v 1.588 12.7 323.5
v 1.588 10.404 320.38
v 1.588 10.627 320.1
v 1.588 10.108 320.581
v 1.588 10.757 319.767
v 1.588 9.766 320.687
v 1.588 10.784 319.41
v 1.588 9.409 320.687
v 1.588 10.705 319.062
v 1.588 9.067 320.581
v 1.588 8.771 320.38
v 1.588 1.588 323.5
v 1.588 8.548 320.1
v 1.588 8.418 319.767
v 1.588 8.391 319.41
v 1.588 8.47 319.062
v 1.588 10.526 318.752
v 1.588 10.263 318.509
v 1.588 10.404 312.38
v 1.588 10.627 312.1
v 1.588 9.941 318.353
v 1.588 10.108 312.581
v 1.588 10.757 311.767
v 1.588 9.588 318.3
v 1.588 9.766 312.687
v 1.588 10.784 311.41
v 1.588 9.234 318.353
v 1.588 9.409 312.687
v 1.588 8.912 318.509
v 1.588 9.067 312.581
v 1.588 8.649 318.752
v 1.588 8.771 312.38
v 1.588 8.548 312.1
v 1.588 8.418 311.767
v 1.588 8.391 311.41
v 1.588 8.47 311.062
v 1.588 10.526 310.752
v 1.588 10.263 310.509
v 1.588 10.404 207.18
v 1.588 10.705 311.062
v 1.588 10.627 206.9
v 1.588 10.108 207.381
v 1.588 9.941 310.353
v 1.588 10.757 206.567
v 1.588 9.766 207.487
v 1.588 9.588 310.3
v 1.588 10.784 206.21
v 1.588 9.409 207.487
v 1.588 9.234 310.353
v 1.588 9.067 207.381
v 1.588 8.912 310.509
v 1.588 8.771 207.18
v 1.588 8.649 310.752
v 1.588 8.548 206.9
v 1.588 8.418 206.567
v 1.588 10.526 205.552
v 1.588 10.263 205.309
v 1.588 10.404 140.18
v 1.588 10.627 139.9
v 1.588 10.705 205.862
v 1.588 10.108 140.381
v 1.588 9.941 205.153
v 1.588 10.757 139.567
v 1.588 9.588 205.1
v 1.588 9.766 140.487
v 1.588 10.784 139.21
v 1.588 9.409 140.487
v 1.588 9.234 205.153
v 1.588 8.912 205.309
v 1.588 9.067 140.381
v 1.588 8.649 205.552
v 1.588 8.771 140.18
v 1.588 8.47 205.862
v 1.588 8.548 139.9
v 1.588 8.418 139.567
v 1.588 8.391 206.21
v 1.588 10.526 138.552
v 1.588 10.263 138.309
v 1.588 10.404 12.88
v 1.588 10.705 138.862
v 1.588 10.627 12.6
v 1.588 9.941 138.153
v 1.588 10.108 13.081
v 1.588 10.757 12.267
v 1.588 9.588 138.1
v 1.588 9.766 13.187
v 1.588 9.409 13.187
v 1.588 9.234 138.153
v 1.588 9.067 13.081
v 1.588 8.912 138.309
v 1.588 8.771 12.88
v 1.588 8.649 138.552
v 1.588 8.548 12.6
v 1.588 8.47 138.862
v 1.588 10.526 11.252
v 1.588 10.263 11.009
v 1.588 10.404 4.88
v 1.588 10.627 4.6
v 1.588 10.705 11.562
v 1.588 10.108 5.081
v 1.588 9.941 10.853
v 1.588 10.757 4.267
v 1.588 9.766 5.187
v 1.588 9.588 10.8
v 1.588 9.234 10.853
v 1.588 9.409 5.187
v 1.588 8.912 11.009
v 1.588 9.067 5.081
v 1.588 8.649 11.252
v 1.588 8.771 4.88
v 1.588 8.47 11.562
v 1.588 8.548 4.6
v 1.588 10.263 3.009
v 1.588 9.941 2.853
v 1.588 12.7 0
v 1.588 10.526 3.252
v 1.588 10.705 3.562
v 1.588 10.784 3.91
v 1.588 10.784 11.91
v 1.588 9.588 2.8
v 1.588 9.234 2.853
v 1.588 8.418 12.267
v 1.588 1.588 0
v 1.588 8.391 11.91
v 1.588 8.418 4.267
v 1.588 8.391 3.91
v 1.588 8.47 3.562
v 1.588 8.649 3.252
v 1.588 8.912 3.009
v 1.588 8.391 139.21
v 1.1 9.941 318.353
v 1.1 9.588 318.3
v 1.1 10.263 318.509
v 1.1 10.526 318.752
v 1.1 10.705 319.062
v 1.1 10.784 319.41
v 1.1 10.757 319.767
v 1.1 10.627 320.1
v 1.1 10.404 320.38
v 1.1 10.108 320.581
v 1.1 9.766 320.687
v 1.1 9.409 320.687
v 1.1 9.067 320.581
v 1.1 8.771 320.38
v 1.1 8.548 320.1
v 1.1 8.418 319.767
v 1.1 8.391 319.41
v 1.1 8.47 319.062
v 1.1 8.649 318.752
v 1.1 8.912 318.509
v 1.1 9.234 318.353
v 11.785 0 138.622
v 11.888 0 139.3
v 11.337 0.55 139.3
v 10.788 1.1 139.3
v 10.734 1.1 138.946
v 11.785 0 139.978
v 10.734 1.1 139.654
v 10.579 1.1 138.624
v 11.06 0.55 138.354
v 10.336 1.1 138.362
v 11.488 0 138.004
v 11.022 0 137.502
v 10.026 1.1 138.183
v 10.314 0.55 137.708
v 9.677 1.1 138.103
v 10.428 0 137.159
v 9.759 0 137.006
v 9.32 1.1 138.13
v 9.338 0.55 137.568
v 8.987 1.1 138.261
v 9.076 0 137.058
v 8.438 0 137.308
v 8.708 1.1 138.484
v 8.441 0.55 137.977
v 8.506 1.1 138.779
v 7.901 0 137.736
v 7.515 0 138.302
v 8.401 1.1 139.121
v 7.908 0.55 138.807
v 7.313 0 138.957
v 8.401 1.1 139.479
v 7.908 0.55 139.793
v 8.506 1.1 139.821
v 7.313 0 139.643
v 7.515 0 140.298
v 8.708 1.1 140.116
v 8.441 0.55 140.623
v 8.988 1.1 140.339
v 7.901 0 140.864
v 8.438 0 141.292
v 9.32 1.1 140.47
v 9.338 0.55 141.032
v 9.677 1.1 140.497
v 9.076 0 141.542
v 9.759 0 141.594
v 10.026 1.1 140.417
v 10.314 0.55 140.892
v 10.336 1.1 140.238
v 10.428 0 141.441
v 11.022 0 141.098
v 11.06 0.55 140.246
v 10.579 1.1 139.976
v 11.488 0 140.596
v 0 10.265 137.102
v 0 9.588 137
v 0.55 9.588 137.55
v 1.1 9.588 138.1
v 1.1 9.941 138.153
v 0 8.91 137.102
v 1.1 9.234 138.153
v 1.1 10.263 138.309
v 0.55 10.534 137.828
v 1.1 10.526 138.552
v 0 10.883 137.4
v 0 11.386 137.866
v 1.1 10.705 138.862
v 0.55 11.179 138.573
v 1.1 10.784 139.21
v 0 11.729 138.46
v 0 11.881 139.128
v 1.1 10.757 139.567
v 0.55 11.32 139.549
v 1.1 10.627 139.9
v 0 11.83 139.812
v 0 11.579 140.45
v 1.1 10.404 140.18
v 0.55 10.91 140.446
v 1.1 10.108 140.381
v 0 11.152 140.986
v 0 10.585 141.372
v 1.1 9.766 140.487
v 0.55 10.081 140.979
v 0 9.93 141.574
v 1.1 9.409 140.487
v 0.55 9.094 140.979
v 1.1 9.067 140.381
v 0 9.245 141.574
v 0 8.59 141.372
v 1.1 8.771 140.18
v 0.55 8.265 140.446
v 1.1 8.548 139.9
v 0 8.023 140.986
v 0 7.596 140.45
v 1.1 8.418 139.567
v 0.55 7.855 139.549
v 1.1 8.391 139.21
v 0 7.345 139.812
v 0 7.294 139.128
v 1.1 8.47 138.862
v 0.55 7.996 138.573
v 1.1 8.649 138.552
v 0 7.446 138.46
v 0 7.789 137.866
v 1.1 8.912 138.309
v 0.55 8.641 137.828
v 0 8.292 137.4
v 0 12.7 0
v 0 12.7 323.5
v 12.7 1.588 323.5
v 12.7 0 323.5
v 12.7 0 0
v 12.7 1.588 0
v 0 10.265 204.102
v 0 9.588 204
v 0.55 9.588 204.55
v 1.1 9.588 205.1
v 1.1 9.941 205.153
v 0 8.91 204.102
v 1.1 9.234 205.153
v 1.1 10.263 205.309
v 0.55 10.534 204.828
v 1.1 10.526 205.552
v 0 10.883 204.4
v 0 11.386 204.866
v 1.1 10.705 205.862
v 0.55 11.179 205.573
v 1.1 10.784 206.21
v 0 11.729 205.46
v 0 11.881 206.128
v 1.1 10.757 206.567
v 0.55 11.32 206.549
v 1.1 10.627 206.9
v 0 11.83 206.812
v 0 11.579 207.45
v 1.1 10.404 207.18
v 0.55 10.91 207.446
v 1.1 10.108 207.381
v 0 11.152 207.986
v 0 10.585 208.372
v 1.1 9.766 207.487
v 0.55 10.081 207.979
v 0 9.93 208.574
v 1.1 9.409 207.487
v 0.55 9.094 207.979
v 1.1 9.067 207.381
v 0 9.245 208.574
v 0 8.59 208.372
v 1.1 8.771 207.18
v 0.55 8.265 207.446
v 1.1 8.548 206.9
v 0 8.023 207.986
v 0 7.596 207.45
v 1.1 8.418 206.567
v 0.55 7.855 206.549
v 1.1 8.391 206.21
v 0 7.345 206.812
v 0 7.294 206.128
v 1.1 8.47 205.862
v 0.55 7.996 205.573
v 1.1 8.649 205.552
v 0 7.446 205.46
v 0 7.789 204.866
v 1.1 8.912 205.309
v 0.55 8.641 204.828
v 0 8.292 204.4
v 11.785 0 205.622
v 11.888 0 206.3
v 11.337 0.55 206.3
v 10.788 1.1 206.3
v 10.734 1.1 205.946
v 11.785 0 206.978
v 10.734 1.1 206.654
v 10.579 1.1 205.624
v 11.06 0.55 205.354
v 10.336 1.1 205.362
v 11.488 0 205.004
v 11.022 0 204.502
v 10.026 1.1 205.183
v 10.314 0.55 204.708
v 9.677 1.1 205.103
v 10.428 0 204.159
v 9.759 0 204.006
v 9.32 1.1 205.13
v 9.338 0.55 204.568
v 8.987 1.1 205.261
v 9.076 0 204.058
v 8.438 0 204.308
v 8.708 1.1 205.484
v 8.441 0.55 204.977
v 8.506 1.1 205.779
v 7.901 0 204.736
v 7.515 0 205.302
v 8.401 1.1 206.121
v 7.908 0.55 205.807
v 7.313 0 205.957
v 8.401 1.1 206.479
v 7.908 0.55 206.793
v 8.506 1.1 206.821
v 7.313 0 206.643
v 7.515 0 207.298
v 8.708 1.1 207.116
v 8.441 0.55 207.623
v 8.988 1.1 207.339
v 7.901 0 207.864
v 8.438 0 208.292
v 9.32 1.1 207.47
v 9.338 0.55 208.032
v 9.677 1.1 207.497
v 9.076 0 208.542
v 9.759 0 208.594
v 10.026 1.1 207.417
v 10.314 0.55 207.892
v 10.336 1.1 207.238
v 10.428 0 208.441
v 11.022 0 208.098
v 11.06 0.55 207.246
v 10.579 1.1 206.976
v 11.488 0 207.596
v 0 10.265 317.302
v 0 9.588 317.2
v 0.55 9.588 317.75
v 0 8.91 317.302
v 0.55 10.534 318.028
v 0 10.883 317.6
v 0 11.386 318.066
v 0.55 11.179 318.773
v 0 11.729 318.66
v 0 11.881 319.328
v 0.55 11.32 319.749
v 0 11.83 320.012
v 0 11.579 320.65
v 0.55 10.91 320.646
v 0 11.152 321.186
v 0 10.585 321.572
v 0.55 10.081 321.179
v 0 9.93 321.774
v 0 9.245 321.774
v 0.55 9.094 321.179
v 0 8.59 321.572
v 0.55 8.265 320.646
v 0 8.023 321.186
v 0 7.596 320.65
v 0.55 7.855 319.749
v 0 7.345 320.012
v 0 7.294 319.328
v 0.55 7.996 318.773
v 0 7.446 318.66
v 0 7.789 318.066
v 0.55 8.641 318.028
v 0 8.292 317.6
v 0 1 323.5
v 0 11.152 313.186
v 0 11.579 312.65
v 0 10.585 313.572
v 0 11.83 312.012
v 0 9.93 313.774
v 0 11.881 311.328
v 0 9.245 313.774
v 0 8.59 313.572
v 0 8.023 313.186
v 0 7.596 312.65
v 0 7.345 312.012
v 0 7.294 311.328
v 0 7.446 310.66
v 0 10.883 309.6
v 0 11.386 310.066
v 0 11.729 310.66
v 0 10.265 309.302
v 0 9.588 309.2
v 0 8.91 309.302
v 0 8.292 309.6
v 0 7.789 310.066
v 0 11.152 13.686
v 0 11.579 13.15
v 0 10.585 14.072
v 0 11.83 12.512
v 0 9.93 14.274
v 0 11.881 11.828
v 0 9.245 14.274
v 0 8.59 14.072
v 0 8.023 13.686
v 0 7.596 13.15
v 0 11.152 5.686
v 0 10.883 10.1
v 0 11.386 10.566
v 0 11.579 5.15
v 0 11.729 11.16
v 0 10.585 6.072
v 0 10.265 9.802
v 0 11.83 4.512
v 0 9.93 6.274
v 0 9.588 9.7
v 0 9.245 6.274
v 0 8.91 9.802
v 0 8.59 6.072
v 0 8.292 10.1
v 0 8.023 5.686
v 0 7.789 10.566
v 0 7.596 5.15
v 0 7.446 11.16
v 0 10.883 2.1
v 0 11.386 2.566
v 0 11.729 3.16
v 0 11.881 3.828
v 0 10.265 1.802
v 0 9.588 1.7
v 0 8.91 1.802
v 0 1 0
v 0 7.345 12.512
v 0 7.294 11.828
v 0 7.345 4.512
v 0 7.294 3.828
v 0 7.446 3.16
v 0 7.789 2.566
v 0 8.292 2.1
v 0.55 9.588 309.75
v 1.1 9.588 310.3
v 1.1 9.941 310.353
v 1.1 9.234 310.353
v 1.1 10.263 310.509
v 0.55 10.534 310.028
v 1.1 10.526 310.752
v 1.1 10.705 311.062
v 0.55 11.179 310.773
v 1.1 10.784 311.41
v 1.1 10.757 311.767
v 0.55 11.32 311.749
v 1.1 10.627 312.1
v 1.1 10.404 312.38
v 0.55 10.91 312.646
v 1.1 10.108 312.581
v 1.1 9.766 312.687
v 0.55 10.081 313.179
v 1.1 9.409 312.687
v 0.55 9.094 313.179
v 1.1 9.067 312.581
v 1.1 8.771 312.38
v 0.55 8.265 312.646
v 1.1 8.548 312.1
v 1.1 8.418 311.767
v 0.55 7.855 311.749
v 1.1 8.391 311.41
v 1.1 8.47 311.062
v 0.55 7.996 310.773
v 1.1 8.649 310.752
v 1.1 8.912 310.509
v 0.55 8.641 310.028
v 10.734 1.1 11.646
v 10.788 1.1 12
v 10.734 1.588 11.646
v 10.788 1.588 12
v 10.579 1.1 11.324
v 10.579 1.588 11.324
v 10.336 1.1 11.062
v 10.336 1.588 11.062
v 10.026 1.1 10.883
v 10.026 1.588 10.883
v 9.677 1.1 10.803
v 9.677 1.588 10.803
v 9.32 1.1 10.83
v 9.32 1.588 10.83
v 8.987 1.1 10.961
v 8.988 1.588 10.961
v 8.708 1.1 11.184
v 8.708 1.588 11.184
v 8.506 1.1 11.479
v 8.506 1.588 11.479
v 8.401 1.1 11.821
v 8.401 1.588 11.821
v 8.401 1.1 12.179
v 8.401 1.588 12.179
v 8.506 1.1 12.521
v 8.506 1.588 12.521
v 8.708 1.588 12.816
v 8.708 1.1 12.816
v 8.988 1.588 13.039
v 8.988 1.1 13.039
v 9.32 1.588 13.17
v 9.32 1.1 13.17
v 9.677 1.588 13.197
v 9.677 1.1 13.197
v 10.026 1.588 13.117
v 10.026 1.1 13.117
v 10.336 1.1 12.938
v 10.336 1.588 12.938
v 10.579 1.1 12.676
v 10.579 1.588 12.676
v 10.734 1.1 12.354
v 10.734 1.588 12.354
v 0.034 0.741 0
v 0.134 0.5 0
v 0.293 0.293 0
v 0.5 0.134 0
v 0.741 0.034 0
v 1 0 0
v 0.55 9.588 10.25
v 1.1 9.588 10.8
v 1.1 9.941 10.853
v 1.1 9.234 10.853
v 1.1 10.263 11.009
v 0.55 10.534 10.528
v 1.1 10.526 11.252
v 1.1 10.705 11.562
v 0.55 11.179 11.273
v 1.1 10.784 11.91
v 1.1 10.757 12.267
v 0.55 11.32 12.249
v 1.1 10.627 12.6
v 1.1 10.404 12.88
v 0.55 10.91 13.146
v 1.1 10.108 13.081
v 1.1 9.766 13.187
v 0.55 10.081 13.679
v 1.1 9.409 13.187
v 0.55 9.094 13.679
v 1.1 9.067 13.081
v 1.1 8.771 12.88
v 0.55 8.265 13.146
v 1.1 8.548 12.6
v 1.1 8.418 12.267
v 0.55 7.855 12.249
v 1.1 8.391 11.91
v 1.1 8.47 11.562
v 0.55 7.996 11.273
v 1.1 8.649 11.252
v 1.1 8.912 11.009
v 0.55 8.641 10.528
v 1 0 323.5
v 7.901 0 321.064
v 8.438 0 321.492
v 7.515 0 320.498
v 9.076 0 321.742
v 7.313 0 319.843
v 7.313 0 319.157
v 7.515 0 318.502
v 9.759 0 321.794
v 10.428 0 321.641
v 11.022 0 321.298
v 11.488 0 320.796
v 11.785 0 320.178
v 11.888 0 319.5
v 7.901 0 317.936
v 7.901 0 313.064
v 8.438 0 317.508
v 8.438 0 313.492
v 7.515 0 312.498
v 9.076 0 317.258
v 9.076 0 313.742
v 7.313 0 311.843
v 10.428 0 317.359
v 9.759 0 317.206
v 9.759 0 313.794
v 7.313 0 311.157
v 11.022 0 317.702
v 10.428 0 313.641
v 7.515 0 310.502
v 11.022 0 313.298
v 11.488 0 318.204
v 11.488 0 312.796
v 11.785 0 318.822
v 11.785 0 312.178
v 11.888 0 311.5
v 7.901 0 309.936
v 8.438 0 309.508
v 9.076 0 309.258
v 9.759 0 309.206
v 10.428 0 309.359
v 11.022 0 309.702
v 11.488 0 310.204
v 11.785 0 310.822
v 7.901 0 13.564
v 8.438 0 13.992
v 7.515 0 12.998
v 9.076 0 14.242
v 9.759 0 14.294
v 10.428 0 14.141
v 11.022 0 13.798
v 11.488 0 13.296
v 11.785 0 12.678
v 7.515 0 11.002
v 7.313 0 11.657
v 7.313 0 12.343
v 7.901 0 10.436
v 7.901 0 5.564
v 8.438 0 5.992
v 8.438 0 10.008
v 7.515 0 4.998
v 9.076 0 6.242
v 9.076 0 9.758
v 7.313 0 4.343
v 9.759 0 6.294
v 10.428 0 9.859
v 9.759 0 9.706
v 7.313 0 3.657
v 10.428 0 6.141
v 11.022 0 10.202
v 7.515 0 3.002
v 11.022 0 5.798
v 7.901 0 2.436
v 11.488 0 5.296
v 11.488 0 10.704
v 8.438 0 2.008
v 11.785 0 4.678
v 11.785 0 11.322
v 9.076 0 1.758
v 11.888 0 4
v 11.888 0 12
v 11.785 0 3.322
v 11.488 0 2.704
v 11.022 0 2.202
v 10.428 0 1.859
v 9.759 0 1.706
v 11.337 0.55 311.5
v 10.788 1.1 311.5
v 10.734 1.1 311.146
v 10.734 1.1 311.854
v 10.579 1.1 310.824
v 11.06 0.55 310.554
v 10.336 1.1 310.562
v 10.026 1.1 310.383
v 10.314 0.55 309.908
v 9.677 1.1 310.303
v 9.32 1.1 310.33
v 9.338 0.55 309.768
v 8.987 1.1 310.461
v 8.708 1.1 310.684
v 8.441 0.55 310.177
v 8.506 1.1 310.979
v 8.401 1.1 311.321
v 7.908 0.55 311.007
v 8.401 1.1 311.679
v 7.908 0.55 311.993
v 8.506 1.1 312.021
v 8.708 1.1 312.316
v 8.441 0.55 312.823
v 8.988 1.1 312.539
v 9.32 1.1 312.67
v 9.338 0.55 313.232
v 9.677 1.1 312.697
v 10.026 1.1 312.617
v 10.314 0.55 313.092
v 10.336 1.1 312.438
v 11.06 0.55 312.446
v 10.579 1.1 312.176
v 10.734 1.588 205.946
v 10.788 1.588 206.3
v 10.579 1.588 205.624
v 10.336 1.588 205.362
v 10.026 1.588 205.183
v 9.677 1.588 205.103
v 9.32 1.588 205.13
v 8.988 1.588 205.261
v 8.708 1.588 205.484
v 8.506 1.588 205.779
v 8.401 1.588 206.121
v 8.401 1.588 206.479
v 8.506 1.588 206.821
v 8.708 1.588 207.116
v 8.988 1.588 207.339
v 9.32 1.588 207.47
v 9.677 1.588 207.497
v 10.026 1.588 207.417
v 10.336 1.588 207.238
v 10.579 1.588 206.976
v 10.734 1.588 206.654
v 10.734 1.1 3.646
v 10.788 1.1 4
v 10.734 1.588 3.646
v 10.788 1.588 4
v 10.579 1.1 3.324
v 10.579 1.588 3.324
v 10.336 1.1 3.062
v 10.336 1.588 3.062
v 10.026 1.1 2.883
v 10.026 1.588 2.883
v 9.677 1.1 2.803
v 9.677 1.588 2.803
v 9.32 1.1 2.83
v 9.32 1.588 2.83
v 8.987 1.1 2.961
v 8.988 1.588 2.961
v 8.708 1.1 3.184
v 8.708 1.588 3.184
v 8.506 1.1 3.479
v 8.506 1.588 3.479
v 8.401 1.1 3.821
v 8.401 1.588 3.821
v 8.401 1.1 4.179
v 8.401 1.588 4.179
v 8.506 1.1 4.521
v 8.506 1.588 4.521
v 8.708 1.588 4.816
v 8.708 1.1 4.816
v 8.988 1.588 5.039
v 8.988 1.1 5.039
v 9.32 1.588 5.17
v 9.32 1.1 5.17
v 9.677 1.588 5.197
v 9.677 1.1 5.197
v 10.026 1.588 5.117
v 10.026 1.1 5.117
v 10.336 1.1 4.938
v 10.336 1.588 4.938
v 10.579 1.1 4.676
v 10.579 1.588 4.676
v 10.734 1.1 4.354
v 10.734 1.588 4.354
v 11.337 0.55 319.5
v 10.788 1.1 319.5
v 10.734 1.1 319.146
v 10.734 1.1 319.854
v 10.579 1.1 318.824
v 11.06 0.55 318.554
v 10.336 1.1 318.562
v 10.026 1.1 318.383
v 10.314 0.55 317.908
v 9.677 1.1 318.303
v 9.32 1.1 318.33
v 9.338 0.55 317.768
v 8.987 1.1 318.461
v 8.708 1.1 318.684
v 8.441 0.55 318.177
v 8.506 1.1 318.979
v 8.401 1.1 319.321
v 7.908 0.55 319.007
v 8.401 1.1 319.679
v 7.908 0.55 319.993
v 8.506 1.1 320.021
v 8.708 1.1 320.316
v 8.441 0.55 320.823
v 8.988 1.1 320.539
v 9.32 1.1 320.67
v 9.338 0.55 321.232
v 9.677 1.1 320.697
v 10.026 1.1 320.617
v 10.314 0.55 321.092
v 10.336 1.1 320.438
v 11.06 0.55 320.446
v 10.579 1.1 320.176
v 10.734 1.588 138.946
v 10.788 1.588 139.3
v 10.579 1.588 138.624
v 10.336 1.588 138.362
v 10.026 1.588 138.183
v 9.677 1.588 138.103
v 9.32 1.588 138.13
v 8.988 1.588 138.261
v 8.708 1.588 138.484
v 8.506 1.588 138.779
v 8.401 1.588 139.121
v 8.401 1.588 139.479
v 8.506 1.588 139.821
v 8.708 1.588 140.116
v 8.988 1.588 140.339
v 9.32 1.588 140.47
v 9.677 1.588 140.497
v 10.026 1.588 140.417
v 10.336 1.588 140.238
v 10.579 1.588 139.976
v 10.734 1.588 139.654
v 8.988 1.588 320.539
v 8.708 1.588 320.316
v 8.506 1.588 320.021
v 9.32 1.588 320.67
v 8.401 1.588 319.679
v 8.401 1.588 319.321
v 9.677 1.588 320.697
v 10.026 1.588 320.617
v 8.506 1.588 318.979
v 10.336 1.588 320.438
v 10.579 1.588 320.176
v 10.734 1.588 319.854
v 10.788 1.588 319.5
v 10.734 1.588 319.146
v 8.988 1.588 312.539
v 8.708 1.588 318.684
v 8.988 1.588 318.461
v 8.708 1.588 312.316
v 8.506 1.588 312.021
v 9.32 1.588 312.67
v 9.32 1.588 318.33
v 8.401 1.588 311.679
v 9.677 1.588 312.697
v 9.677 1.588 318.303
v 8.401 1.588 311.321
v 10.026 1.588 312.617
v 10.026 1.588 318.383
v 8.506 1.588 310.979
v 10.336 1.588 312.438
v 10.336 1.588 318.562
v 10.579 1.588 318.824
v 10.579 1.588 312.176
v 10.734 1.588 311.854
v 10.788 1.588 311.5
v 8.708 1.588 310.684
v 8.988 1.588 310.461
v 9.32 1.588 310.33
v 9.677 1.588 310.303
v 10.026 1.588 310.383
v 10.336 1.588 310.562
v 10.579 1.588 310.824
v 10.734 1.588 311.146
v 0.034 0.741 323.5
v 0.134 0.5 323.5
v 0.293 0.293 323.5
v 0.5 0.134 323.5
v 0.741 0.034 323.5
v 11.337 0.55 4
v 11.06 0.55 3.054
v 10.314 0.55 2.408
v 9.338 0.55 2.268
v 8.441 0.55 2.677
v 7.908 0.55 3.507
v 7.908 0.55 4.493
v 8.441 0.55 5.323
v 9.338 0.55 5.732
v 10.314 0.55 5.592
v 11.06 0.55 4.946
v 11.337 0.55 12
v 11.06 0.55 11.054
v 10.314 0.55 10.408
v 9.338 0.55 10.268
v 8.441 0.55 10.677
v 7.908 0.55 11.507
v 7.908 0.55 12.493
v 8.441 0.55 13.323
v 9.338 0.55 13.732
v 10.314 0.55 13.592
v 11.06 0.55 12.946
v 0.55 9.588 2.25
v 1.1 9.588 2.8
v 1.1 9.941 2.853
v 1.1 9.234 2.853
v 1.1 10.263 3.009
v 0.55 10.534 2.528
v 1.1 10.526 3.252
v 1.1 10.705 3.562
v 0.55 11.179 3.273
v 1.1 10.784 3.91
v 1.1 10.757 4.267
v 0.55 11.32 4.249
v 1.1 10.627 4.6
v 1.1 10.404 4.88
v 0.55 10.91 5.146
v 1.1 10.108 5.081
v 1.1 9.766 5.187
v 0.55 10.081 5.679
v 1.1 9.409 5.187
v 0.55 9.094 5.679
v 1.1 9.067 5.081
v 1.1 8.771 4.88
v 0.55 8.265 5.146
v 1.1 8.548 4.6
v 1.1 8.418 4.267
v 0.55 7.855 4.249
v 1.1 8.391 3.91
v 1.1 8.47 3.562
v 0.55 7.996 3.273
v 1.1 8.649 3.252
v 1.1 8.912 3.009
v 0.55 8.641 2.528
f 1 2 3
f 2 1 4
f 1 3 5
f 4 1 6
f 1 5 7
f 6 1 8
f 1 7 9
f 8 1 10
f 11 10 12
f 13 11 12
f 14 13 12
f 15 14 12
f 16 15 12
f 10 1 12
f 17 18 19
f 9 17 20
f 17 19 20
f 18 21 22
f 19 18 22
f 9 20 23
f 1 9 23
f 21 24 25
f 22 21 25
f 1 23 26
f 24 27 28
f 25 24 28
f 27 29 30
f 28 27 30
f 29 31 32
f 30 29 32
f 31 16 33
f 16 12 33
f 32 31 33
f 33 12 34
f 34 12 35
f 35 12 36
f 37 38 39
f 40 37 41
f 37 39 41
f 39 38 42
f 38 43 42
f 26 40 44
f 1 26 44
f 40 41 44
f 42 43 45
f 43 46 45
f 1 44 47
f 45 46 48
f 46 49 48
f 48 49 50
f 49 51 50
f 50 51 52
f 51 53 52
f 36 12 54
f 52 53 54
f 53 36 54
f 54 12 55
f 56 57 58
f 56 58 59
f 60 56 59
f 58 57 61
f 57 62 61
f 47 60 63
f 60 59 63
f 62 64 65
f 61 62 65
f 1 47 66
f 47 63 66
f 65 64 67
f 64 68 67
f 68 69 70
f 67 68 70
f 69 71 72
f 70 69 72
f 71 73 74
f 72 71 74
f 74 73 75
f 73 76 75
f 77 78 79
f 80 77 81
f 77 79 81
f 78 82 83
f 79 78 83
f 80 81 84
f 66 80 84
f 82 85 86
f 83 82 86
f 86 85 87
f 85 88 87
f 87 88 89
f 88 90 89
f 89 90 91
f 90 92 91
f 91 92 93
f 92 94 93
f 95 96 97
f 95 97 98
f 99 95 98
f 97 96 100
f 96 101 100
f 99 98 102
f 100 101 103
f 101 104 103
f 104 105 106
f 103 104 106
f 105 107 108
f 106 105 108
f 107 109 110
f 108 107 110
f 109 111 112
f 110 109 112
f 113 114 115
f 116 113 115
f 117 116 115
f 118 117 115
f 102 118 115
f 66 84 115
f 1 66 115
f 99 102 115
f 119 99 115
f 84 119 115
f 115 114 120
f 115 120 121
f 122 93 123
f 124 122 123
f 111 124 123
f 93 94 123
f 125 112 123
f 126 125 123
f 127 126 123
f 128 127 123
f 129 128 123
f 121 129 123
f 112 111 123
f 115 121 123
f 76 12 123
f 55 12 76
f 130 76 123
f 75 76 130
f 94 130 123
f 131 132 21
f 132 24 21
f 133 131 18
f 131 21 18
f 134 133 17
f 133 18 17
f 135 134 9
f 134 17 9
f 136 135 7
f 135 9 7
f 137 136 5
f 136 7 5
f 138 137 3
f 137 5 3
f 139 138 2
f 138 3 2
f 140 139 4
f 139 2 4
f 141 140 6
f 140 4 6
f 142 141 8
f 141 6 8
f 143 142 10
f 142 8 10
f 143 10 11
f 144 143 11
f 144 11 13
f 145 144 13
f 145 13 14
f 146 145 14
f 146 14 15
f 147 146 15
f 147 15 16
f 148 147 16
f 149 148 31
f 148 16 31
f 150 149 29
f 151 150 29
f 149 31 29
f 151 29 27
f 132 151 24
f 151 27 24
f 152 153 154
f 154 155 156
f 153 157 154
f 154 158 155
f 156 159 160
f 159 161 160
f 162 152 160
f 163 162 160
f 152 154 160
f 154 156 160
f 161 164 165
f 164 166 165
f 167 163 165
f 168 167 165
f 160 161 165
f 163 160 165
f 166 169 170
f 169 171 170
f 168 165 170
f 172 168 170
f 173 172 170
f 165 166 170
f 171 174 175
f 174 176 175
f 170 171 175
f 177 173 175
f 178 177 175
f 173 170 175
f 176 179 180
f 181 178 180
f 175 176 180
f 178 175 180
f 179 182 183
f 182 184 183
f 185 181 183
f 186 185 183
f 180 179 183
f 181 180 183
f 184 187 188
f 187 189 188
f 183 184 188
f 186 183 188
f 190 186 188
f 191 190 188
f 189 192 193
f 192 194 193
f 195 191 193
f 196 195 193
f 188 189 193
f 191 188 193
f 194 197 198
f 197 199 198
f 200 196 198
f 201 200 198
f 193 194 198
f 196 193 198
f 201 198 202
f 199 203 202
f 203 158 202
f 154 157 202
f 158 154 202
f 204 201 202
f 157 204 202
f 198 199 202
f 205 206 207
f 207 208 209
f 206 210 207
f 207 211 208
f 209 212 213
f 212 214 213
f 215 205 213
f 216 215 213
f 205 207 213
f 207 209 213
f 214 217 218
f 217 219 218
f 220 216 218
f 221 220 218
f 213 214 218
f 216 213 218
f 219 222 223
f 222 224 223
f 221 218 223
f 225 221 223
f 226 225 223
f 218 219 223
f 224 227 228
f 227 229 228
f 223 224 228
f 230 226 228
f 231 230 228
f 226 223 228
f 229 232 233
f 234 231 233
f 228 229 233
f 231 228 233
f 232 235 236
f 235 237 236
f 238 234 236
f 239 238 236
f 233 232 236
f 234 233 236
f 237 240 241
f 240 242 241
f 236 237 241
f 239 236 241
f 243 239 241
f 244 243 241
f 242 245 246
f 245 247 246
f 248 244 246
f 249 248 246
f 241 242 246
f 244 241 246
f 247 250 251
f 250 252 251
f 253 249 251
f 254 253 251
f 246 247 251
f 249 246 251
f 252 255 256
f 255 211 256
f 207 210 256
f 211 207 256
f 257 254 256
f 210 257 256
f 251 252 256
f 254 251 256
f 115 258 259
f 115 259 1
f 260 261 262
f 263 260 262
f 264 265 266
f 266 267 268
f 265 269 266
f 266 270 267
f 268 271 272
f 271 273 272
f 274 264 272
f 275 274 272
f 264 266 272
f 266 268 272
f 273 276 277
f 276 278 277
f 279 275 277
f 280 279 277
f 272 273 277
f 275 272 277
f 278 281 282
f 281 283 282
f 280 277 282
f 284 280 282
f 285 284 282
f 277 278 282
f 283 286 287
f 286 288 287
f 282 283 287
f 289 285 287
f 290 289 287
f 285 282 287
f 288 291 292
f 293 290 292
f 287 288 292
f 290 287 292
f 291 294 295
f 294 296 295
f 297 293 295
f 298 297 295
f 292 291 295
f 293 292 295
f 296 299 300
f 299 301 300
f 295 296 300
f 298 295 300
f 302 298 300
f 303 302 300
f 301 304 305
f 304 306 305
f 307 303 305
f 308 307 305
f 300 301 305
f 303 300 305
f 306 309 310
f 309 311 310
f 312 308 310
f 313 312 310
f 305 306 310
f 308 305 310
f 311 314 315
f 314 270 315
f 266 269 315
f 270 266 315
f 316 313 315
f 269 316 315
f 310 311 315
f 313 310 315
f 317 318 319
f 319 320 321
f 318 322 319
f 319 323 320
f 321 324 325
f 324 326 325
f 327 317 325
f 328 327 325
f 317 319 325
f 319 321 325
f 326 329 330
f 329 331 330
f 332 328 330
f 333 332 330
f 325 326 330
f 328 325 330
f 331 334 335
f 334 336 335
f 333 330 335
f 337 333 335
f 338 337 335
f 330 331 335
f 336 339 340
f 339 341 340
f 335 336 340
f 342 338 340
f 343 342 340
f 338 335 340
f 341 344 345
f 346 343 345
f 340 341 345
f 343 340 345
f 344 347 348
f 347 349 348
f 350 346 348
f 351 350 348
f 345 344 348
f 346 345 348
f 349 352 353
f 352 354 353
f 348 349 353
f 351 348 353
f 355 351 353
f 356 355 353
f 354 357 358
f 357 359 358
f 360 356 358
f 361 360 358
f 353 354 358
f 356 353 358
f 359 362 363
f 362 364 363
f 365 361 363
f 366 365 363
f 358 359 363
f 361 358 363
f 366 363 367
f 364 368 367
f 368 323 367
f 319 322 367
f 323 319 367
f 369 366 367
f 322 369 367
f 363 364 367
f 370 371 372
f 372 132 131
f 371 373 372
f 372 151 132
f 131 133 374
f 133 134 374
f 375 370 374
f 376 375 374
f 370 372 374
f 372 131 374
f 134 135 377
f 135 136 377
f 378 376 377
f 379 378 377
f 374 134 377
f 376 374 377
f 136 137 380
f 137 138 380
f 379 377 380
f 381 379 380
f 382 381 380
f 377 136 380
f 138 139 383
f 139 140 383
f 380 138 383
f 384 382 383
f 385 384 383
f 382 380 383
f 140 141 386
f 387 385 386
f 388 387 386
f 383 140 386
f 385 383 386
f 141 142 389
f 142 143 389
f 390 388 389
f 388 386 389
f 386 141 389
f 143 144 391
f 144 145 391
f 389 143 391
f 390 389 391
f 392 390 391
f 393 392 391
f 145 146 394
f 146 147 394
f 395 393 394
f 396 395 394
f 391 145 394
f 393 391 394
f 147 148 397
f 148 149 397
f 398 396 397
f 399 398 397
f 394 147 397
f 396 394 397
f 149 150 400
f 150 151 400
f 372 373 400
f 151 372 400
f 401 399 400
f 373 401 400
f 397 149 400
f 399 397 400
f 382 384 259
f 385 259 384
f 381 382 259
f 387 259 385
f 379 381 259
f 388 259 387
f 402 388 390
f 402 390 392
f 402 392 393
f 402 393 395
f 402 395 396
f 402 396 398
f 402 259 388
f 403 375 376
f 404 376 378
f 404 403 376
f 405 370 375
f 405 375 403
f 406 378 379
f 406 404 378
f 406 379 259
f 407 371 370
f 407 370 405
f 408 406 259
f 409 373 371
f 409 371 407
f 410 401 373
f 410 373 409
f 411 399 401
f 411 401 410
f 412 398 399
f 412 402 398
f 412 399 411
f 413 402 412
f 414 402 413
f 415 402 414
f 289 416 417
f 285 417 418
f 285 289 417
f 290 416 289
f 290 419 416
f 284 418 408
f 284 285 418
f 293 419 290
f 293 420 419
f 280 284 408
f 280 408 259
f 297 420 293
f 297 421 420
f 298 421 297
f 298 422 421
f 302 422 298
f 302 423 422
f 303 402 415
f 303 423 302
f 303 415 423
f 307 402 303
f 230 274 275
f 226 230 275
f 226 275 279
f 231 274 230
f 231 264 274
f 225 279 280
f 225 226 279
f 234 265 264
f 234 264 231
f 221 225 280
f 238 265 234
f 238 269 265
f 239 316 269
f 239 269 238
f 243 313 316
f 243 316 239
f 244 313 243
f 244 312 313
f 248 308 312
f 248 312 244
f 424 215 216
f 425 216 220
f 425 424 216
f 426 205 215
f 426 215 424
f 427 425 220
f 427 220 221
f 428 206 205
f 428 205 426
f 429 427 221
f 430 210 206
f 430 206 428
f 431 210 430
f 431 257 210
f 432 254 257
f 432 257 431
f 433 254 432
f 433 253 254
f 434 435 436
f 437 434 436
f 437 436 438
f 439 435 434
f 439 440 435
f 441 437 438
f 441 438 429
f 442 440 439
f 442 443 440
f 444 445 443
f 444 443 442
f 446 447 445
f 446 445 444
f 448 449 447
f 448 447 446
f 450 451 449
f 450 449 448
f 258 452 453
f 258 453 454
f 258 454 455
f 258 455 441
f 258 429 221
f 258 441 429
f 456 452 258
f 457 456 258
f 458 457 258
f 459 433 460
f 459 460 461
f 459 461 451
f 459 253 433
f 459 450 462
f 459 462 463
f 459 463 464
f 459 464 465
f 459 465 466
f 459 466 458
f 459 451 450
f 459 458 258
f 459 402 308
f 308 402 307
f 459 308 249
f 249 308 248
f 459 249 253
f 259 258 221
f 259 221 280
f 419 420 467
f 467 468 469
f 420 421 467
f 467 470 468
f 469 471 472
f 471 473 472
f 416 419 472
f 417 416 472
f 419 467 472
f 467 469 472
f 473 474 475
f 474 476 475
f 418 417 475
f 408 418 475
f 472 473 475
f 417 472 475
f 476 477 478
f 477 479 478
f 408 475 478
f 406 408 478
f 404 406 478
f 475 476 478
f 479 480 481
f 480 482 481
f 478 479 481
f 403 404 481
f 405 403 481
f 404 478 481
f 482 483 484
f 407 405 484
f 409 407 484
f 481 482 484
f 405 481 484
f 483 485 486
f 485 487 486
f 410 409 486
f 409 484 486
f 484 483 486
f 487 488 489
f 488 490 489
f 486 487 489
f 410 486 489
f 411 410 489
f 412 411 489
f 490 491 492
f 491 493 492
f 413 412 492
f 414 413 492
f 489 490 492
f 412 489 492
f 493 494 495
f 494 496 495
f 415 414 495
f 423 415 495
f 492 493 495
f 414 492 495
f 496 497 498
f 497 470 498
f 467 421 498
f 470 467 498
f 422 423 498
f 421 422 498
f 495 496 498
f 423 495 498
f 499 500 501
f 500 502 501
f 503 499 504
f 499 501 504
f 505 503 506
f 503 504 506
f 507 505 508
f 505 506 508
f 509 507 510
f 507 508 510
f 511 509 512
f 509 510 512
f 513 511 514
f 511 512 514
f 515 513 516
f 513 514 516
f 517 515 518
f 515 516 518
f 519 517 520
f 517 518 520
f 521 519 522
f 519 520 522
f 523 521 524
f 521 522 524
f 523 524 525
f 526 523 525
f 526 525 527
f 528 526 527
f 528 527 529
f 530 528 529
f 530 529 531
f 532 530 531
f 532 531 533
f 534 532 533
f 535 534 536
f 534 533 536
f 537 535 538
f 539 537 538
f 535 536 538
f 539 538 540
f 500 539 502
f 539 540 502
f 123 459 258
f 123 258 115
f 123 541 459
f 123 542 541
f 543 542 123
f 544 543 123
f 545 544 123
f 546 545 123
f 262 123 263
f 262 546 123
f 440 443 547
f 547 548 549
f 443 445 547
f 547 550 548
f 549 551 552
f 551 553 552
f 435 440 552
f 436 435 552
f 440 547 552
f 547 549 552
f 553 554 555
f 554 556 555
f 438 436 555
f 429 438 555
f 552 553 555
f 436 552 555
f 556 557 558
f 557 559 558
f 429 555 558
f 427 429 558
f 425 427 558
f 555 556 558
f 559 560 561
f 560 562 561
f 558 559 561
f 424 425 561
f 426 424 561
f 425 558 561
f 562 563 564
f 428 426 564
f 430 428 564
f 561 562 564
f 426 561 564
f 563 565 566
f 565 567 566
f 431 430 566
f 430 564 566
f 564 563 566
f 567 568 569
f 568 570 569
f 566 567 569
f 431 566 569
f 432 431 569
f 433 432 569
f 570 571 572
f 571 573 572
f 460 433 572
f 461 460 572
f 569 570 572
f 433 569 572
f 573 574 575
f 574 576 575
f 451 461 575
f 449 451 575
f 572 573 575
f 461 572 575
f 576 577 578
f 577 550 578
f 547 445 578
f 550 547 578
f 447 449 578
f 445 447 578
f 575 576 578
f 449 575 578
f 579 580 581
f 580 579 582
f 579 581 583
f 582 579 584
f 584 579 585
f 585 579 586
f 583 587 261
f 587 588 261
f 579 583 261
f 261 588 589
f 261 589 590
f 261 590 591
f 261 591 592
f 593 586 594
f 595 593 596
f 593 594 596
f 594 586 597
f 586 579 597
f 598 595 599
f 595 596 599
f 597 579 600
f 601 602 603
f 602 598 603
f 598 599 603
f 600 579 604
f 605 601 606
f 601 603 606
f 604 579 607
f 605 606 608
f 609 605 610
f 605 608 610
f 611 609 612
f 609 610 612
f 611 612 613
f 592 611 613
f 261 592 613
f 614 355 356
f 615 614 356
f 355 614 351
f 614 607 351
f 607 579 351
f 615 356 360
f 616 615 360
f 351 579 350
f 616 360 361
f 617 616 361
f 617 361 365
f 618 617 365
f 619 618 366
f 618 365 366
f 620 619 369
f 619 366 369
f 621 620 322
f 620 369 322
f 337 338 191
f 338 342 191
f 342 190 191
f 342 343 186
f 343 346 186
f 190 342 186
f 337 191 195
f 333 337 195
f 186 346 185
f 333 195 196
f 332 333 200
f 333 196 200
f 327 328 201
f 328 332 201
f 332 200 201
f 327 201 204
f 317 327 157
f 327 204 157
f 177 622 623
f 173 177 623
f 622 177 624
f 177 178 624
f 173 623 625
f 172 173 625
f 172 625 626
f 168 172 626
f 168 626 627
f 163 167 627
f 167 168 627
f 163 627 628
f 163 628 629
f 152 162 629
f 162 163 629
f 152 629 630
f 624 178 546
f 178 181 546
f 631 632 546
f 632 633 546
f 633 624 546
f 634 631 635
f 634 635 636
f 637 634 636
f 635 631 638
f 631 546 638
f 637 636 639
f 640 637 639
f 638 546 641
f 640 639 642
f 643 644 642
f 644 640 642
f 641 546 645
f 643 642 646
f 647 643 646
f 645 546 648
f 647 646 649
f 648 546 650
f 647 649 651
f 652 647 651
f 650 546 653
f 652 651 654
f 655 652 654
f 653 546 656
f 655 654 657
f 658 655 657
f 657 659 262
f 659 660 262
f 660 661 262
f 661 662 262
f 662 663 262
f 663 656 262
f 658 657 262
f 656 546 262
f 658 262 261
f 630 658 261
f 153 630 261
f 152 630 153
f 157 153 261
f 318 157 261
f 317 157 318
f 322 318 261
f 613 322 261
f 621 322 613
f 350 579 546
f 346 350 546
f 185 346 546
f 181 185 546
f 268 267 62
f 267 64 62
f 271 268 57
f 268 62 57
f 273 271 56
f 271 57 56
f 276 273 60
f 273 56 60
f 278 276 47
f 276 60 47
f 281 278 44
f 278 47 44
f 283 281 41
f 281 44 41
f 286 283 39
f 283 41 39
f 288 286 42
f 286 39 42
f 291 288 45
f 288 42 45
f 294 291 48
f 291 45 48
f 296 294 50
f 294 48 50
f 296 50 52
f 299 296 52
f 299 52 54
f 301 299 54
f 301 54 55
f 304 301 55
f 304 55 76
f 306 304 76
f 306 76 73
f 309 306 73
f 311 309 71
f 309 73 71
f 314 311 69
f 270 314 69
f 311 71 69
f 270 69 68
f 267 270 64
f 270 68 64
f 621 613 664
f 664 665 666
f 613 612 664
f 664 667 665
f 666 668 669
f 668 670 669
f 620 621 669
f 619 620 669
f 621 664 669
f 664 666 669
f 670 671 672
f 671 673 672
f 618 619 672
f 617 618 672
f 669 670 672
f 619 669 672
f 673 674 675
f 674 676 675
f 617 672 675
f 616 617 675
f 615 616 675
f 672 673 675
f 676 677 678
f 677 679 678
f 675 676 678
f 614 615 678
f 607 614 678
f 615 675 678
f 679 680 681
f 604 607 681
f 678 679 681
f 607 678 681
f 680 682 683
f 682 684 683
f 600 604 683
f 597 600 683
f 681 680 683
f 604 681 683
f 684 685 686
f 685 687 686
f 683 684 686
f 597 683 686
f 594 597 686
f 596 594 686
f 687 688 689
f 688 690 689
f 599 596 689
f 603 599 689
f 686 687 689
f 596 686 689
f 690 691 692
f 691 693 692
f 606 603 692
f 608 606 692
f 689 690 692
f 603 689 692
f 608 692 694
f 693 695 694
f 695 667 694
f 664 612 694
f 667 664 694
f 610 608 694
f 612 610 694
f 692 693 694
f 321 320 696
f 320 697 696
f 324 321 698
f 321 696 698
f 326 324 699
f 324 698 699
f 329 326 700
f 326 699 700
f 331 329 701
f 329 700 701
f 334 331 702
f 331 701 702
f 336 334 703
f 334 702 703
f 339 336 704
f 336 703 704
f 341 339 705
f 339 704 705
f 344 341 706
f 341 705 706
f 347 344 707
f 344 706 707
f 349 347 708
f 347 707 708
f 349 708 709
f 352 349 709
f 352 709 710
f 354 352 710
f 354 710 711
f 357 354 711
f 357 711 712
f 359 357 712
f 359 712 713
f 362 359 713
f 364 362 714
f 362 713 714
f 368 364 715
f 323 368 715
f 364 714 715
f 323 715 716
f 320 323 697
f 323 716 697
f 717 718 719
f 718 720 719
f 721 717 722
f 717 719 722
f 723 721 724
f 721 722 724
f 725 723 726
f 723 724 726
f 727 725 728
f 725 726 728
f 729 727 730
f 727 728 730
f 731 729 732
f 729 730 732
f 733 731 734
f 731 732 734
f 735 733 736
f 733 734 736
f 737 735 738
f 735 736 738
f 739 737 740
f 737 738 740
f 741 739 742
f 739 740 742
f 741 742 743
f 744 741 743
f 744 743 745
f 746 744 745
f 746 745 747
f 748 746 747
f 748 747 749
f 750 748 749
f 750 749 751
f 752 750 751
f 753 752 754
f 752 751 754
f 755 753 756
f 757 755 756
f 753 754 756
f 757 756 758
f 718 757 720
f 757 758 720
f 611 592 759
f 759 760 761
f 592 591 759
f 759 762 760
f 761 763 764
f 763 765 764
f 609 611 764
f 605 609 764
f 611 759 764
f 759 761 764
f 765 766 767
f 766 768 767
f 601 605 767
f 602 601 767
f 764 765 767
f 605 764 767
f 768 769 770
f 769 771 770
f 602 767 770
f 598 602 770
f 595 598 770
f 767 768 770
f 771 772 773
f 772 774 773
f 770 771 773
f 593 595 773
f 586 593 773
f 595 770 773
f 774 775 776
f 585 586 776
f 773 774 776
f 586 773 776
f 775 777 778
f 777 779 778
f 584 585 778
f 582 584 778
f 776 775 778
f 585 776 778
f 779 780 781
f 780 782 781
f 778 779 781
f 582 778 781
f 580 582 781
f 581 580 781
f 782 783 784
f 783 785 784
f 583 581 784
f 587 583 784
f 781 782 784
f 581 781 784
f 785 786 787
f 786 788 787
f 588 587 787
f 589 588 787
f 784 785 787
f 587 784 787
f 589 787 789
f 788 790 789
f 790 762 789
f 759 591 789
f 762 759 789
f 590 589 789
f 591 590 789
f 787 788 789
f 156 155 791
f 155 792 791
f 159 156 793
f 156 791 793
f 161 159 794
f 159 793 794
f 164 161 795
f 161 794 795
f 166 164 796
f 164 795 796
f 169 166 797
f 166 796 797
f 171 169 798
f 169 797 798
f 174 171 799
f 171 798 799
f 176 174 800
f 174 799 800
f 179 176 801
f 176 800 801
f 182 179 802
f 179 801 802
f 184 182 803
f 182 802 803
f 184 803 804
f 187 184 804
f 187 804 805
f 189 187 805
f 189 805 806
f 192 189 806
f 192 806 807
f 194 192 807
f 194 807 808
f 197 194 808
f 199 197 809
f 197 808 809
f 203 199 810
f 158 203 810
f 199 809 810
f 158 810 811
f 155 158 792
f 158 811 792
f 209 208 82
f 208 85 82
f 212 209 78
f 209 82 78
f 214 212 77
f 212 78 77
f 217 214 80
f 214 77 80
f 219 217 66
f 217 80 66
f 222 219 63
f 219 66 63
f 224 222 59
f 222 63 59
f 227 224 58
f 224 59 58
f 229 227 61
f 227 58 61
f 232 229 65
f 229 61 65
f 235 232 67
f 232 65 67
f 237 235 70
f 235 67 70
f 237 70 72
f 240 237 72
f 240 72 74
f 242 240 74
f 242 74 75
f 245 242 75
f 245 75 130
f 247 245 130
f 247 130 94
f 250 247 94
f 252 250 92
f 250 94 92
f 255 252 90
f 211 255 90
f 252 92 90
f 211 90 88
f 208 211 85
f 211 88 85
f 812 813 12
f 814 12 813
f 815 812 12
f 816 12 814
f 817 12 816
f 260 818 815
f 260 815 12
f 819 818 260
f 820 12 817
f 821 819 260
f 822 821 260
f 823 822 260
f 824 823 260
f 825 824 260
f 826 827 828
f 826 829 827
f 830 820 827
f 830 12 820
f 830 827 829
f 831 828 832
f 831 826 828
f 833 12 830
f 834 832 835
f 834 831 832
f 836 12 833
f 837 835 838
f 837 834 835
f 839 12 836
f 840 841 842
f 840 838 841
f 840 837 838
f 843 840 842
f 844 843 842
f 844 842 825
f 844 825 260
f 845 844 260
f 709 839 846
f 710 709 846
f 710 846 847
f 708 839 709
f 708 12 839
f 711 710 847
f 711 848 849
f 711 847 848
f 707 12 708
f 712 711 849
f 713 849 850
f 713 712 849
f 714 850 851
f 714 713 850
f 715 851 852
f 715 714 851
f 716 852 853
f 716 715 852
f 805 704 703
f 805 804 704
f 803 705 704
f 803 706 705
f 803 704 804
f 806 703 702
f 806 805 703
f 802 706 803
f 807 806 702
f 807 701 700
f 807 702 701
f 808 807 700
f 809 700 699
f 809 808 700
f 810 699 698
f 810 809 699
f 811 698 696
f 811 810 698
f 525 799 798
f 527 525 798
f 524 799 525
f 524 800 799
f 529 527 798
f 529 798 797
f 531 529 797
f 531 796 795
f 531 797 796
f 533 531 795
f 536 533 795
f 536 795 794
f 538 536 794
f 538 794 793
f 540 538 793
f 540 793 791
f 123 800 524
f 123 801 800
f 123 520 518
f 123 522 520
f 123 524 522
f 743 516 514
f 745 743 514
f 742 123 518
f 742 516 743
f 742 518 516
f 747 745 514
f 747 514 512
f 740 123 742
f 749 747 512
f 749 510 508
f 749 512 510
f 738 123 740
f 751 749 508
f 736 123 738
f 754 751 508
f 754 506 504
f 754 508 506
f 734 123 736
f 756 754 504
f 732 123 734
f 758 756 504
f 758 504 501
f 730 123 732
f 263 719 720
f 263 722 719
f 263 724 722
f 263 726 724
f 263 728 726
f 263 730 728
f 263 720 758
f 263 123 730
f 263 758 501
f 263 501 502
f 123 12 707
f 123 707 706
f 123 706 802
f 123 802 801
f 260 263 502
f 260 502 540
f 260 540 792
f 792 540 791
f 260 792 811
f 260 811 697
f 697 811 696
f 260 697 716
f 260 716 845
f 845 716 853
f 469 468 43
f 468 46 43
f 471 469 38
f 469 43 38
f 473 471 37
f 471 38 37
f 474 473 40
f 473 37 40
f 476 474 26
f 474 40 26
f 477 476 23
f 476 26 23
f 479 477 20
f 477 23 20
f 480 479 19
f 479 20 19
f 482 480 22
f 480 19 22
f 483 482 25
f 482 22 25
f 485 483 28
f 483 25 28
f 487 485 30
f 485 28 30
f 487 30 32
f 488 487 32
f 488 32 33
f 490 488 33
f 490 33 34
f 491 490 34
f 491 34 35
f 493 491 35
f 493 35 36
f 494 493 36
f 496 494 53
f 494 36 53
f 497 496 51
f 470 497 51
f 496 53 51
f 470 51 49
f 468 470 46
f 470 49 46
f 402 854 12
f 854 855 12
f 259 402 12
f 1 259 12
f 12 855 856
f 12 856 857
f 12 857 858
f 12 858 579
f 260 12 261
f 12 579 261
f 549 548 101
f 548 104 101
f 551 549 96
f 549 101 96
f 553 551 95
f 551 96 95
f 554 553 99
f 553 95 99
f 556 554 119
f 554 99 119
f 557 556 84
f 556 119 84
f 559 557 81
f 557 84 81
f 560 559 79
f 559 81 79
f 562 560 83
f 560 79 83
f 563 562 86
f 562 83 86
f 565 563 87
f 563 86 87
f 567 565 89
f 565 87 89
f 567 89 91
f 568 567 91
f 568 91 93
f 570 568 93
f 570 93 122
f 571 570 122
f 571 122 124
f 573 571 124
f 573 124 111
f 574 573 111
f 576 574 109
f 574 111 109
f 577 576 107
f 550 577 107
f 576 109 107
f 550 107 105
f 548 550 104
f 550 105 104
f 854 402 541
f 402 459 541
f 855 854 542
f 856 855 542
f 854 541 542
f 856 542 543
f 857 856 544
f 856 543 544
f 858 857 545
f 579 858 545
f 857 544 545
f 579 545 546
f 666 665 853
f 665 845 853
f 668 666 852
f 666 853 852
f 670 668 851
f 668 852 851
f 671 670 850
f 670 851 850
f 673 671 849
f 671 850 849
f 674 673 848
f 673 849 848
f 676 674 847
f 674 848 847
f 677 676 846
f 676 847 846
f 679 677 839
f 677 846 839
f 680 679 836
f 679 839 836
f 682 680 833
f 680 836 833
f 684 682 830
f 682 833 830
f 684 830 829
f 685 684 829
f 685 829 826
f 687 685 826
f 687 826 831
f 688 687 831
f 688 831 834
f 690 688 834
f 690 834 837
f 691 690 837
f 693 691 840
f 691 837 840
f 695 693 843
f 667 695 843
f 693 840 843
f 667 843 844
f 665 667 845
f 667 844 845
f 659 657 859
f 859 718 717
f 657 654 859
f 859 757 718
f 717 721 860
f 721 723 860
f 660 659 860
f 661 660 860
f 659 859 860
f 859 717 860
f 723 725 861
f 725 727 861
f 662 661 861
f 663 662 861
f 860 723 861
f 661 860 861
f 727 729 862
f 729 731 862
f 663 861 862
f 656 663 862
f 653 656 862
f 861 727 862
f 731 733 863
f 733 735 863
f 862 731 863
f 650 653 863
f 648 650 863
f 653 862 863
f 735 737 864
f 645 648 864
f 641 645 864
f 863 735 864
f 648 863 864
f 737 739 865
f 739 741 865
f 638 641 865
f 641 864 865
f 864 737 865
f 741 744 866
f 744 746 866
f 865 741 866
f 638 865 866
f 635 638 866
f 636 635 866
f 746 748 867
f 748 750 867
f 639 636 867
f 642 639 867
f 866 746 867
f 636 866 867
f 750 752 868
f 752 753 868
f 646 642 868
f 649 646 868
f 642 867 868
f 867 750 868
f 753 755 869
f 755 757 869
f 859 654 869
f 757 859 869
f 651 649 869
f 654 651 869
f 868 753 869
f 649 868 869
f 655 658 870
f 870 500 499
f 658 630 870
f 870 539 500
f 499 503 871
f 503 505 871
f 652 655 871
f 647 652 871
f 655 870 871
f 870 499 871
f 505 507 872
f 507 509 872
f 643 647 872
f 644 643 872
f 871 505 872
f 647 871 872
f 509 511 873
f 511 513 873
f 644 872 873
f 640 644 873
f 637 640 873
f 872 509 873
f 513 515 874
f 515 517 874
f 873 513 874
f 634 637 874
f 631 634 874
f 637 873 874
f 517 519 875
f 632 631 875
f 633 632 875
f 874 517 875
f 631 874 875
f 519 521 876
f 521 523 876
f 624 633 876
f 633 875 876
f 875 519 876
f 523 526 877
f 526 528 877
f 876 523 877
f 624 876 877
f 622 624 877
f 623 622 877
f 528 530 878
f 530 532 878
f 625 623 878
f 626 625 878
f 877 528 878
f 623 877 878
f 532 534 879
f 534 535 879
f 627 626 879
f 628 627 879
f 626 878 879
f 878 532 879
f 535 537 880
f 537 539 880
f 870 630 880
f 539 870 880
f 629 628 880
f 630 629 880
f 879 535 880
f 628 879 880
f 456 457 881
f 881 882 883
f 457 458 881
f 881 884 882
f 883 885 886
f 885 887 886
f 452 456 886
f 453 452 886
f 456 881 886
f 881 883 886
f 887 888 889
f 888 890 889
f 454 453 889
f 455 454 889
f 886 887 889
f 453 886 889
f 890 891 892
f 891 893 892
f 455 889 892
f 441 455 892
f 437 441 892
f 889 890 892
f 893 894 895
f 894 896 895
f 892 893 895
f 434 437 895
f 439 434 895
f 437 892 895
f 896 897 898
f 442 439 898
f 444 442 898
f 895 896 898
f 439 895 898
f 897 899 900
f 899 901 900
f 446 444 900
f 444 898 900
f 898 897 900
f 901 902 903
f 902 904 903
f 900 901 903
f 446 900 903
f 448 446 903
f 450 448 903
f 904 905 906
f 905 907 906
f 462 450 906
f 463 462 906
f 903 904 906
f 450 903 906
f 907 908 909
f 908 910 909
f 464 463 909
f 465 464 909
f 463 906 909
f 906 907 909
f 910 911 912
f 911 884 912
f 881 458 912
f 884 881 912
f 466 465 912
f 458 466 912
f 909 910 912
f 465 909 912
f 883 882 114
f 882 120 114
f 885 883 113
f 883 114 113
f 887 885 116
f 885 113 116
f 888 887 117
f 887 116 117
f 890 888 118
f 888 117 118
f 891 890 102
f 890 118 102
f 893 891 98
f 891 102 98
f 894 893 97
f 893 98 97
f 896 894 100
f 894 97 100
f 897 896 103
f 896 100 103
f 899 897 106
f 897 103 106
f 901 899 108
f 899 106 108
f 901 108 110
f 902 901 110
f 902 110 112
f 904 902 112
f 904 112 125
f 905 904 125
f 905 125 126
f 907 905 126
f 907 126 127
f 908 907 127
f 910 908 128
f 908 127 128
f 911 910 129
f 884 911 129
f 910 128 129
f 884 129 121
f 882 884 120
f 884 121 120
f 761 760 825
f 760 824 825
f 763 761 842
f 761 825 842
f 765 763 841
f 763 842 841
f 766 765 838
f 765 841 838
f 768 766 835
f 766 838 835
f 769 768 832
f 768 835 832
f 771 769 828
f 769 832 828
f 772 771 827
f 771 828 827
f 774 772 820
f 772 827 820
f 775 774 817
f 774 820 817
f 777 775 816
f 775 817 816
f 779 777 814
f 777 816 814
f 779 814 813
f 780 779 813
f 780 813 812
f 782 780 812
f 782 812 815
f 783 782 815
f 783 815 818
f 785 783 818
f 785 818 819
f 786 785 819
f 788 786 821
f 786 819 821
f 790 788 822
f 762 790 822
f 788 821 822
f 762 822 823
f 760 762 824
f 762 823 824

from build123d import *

# Parameters (mm, degrees)
SKETCH1_W                      = 12.7
SKETCH1_H                      = 323.5
BOSS_EXTRUDE1_DEPTH            = 1.5875
SKETCH2_W                      = 1.5875
SKETCH2_H                      = 323.5
BOSS_EXTRUDE2_DEPTH            = 11.1125
FILLET1_R                      = 1
M2_CLEARANCE_HOLE1_D           = 2.4
M2_CLEARANCE_HOLE1_DEPTH       = 2
M2_CLEARANCE_HOLE1_CSINK_D     = 4.6
M2_CLEARANCE_HOLE1_CSINK_ANGLE = 90
M2_CLEARANCE_HOLE1_TIP         = 0.721032743
M2_CLEARANCE_HOLE2_D           = 2.4
M2_CLEARANCE_HOLE2_DEPTH       = 2
M2_CLEARANCE_HOLE2_CSINK_D     = 4.6
M2_CLEARANCE_HOLE2_CSINK_ANGLE = 90
M2_CLEARANCE_HOLE2_TIP         = 0.721032743


with BuildPart() as part:
    # Sketch1 → Boss-Extrude1 (new body)
    with BuildSketch(Plane(origin=(0, 0, 0), x_dir=(1, 0, 0), z_dir=(0, 1, 0))):
        with Locations((6.35, -161.75)):
            Rectangle(SKETCH1_W, SKETCH1_H)
    extrude(amount=BOSS_EXTRUDE1_DEPTH)

    # Sketch2 → Boss-Extrude2 (add)
    with BuildSketch(Plane(origin=(0, 1.5875, 0), x_dir=(1, 0, 0), z_dir=(0, 1, 0))):
        with Locations((0.79375, -161.75)):
            Rectangle(SKETCH2_W, SKETCH2_H)
    extrude(amount=BOSS_EXTRUDE2_DEPTH)

    # Fillet1
    fillet1_edges = [part.edges().sort_by_distance(p)[0] for p in [
        (0, 0, 161.75),
    ]]
    fillet(fillet1_edges, radius=FILLET1_R)

    # M2 Clearance Hole1
    with Locations(Plane.ZY):
        with Locations((4, 9.5875), (12, 9.5875), (139.3, 9.5875), (206.3, 9.5875), (319.5, 9.5875), (311.5, 9.5875)):
            CounterSinkHole(M2_CLEARANCE_HOLE1_D / 2, M2_CLEARANCE_HOLE1_CSINK_D / 2, depth=M2_CLEARANCE_HOLE1_DEPTH, counter_sink_angle=M2_CLEARANCE_HOLE1_CSINK_ANGLE)
            with Locations((0, 0, -(M2_CLEARANCE_HOLE1_DEPTH + M2_CLEARANCE_HOLE1_TIP / 2))):  # 118° drill point
                Cone(0, M2_CLEARANCE_HOLE1_D / 2, M2_CLEARANCE_HOLE1_TIP, mode=Mode.SUBTRACT)

    # M2 Clearance Hole2
    with Locations(Plane(origin=(0, 0, 0), x_dir=(-1, 0, 0), z_dir=(0, -1, 0))):
        with Locations((-9.5875, -4), (-9.5875, -12), (-9.5875, -139.3), (-9.5875, -206.3), (-9.5875, -311.5), (-9.5875, -319.5)):
            CounterSinkHole(M2_CLEARANCE_HOLE2_D / 2, M2_CLEARANCE_HOLE2_CSINK_D / 2, depth=M2_CLEARANCE_HOLE2_DEPTH, counter_sink_angle=M2_CLEARANCE_HOLE2_CSINK_ANGLE)
            with Locations((0, 0, -(M2_CLEARANCE_HOLE2_DEPTH + M2_CLEARANCE_HOLE2_TIP / 2))):  # 118° drill point
                Cone(0, M2_CLEARANCE_HOLE2_D / 2, M2_CLEARANCE_HOLE2_TIP, mode=Mode.SUBTRACT)


solid = part.part
